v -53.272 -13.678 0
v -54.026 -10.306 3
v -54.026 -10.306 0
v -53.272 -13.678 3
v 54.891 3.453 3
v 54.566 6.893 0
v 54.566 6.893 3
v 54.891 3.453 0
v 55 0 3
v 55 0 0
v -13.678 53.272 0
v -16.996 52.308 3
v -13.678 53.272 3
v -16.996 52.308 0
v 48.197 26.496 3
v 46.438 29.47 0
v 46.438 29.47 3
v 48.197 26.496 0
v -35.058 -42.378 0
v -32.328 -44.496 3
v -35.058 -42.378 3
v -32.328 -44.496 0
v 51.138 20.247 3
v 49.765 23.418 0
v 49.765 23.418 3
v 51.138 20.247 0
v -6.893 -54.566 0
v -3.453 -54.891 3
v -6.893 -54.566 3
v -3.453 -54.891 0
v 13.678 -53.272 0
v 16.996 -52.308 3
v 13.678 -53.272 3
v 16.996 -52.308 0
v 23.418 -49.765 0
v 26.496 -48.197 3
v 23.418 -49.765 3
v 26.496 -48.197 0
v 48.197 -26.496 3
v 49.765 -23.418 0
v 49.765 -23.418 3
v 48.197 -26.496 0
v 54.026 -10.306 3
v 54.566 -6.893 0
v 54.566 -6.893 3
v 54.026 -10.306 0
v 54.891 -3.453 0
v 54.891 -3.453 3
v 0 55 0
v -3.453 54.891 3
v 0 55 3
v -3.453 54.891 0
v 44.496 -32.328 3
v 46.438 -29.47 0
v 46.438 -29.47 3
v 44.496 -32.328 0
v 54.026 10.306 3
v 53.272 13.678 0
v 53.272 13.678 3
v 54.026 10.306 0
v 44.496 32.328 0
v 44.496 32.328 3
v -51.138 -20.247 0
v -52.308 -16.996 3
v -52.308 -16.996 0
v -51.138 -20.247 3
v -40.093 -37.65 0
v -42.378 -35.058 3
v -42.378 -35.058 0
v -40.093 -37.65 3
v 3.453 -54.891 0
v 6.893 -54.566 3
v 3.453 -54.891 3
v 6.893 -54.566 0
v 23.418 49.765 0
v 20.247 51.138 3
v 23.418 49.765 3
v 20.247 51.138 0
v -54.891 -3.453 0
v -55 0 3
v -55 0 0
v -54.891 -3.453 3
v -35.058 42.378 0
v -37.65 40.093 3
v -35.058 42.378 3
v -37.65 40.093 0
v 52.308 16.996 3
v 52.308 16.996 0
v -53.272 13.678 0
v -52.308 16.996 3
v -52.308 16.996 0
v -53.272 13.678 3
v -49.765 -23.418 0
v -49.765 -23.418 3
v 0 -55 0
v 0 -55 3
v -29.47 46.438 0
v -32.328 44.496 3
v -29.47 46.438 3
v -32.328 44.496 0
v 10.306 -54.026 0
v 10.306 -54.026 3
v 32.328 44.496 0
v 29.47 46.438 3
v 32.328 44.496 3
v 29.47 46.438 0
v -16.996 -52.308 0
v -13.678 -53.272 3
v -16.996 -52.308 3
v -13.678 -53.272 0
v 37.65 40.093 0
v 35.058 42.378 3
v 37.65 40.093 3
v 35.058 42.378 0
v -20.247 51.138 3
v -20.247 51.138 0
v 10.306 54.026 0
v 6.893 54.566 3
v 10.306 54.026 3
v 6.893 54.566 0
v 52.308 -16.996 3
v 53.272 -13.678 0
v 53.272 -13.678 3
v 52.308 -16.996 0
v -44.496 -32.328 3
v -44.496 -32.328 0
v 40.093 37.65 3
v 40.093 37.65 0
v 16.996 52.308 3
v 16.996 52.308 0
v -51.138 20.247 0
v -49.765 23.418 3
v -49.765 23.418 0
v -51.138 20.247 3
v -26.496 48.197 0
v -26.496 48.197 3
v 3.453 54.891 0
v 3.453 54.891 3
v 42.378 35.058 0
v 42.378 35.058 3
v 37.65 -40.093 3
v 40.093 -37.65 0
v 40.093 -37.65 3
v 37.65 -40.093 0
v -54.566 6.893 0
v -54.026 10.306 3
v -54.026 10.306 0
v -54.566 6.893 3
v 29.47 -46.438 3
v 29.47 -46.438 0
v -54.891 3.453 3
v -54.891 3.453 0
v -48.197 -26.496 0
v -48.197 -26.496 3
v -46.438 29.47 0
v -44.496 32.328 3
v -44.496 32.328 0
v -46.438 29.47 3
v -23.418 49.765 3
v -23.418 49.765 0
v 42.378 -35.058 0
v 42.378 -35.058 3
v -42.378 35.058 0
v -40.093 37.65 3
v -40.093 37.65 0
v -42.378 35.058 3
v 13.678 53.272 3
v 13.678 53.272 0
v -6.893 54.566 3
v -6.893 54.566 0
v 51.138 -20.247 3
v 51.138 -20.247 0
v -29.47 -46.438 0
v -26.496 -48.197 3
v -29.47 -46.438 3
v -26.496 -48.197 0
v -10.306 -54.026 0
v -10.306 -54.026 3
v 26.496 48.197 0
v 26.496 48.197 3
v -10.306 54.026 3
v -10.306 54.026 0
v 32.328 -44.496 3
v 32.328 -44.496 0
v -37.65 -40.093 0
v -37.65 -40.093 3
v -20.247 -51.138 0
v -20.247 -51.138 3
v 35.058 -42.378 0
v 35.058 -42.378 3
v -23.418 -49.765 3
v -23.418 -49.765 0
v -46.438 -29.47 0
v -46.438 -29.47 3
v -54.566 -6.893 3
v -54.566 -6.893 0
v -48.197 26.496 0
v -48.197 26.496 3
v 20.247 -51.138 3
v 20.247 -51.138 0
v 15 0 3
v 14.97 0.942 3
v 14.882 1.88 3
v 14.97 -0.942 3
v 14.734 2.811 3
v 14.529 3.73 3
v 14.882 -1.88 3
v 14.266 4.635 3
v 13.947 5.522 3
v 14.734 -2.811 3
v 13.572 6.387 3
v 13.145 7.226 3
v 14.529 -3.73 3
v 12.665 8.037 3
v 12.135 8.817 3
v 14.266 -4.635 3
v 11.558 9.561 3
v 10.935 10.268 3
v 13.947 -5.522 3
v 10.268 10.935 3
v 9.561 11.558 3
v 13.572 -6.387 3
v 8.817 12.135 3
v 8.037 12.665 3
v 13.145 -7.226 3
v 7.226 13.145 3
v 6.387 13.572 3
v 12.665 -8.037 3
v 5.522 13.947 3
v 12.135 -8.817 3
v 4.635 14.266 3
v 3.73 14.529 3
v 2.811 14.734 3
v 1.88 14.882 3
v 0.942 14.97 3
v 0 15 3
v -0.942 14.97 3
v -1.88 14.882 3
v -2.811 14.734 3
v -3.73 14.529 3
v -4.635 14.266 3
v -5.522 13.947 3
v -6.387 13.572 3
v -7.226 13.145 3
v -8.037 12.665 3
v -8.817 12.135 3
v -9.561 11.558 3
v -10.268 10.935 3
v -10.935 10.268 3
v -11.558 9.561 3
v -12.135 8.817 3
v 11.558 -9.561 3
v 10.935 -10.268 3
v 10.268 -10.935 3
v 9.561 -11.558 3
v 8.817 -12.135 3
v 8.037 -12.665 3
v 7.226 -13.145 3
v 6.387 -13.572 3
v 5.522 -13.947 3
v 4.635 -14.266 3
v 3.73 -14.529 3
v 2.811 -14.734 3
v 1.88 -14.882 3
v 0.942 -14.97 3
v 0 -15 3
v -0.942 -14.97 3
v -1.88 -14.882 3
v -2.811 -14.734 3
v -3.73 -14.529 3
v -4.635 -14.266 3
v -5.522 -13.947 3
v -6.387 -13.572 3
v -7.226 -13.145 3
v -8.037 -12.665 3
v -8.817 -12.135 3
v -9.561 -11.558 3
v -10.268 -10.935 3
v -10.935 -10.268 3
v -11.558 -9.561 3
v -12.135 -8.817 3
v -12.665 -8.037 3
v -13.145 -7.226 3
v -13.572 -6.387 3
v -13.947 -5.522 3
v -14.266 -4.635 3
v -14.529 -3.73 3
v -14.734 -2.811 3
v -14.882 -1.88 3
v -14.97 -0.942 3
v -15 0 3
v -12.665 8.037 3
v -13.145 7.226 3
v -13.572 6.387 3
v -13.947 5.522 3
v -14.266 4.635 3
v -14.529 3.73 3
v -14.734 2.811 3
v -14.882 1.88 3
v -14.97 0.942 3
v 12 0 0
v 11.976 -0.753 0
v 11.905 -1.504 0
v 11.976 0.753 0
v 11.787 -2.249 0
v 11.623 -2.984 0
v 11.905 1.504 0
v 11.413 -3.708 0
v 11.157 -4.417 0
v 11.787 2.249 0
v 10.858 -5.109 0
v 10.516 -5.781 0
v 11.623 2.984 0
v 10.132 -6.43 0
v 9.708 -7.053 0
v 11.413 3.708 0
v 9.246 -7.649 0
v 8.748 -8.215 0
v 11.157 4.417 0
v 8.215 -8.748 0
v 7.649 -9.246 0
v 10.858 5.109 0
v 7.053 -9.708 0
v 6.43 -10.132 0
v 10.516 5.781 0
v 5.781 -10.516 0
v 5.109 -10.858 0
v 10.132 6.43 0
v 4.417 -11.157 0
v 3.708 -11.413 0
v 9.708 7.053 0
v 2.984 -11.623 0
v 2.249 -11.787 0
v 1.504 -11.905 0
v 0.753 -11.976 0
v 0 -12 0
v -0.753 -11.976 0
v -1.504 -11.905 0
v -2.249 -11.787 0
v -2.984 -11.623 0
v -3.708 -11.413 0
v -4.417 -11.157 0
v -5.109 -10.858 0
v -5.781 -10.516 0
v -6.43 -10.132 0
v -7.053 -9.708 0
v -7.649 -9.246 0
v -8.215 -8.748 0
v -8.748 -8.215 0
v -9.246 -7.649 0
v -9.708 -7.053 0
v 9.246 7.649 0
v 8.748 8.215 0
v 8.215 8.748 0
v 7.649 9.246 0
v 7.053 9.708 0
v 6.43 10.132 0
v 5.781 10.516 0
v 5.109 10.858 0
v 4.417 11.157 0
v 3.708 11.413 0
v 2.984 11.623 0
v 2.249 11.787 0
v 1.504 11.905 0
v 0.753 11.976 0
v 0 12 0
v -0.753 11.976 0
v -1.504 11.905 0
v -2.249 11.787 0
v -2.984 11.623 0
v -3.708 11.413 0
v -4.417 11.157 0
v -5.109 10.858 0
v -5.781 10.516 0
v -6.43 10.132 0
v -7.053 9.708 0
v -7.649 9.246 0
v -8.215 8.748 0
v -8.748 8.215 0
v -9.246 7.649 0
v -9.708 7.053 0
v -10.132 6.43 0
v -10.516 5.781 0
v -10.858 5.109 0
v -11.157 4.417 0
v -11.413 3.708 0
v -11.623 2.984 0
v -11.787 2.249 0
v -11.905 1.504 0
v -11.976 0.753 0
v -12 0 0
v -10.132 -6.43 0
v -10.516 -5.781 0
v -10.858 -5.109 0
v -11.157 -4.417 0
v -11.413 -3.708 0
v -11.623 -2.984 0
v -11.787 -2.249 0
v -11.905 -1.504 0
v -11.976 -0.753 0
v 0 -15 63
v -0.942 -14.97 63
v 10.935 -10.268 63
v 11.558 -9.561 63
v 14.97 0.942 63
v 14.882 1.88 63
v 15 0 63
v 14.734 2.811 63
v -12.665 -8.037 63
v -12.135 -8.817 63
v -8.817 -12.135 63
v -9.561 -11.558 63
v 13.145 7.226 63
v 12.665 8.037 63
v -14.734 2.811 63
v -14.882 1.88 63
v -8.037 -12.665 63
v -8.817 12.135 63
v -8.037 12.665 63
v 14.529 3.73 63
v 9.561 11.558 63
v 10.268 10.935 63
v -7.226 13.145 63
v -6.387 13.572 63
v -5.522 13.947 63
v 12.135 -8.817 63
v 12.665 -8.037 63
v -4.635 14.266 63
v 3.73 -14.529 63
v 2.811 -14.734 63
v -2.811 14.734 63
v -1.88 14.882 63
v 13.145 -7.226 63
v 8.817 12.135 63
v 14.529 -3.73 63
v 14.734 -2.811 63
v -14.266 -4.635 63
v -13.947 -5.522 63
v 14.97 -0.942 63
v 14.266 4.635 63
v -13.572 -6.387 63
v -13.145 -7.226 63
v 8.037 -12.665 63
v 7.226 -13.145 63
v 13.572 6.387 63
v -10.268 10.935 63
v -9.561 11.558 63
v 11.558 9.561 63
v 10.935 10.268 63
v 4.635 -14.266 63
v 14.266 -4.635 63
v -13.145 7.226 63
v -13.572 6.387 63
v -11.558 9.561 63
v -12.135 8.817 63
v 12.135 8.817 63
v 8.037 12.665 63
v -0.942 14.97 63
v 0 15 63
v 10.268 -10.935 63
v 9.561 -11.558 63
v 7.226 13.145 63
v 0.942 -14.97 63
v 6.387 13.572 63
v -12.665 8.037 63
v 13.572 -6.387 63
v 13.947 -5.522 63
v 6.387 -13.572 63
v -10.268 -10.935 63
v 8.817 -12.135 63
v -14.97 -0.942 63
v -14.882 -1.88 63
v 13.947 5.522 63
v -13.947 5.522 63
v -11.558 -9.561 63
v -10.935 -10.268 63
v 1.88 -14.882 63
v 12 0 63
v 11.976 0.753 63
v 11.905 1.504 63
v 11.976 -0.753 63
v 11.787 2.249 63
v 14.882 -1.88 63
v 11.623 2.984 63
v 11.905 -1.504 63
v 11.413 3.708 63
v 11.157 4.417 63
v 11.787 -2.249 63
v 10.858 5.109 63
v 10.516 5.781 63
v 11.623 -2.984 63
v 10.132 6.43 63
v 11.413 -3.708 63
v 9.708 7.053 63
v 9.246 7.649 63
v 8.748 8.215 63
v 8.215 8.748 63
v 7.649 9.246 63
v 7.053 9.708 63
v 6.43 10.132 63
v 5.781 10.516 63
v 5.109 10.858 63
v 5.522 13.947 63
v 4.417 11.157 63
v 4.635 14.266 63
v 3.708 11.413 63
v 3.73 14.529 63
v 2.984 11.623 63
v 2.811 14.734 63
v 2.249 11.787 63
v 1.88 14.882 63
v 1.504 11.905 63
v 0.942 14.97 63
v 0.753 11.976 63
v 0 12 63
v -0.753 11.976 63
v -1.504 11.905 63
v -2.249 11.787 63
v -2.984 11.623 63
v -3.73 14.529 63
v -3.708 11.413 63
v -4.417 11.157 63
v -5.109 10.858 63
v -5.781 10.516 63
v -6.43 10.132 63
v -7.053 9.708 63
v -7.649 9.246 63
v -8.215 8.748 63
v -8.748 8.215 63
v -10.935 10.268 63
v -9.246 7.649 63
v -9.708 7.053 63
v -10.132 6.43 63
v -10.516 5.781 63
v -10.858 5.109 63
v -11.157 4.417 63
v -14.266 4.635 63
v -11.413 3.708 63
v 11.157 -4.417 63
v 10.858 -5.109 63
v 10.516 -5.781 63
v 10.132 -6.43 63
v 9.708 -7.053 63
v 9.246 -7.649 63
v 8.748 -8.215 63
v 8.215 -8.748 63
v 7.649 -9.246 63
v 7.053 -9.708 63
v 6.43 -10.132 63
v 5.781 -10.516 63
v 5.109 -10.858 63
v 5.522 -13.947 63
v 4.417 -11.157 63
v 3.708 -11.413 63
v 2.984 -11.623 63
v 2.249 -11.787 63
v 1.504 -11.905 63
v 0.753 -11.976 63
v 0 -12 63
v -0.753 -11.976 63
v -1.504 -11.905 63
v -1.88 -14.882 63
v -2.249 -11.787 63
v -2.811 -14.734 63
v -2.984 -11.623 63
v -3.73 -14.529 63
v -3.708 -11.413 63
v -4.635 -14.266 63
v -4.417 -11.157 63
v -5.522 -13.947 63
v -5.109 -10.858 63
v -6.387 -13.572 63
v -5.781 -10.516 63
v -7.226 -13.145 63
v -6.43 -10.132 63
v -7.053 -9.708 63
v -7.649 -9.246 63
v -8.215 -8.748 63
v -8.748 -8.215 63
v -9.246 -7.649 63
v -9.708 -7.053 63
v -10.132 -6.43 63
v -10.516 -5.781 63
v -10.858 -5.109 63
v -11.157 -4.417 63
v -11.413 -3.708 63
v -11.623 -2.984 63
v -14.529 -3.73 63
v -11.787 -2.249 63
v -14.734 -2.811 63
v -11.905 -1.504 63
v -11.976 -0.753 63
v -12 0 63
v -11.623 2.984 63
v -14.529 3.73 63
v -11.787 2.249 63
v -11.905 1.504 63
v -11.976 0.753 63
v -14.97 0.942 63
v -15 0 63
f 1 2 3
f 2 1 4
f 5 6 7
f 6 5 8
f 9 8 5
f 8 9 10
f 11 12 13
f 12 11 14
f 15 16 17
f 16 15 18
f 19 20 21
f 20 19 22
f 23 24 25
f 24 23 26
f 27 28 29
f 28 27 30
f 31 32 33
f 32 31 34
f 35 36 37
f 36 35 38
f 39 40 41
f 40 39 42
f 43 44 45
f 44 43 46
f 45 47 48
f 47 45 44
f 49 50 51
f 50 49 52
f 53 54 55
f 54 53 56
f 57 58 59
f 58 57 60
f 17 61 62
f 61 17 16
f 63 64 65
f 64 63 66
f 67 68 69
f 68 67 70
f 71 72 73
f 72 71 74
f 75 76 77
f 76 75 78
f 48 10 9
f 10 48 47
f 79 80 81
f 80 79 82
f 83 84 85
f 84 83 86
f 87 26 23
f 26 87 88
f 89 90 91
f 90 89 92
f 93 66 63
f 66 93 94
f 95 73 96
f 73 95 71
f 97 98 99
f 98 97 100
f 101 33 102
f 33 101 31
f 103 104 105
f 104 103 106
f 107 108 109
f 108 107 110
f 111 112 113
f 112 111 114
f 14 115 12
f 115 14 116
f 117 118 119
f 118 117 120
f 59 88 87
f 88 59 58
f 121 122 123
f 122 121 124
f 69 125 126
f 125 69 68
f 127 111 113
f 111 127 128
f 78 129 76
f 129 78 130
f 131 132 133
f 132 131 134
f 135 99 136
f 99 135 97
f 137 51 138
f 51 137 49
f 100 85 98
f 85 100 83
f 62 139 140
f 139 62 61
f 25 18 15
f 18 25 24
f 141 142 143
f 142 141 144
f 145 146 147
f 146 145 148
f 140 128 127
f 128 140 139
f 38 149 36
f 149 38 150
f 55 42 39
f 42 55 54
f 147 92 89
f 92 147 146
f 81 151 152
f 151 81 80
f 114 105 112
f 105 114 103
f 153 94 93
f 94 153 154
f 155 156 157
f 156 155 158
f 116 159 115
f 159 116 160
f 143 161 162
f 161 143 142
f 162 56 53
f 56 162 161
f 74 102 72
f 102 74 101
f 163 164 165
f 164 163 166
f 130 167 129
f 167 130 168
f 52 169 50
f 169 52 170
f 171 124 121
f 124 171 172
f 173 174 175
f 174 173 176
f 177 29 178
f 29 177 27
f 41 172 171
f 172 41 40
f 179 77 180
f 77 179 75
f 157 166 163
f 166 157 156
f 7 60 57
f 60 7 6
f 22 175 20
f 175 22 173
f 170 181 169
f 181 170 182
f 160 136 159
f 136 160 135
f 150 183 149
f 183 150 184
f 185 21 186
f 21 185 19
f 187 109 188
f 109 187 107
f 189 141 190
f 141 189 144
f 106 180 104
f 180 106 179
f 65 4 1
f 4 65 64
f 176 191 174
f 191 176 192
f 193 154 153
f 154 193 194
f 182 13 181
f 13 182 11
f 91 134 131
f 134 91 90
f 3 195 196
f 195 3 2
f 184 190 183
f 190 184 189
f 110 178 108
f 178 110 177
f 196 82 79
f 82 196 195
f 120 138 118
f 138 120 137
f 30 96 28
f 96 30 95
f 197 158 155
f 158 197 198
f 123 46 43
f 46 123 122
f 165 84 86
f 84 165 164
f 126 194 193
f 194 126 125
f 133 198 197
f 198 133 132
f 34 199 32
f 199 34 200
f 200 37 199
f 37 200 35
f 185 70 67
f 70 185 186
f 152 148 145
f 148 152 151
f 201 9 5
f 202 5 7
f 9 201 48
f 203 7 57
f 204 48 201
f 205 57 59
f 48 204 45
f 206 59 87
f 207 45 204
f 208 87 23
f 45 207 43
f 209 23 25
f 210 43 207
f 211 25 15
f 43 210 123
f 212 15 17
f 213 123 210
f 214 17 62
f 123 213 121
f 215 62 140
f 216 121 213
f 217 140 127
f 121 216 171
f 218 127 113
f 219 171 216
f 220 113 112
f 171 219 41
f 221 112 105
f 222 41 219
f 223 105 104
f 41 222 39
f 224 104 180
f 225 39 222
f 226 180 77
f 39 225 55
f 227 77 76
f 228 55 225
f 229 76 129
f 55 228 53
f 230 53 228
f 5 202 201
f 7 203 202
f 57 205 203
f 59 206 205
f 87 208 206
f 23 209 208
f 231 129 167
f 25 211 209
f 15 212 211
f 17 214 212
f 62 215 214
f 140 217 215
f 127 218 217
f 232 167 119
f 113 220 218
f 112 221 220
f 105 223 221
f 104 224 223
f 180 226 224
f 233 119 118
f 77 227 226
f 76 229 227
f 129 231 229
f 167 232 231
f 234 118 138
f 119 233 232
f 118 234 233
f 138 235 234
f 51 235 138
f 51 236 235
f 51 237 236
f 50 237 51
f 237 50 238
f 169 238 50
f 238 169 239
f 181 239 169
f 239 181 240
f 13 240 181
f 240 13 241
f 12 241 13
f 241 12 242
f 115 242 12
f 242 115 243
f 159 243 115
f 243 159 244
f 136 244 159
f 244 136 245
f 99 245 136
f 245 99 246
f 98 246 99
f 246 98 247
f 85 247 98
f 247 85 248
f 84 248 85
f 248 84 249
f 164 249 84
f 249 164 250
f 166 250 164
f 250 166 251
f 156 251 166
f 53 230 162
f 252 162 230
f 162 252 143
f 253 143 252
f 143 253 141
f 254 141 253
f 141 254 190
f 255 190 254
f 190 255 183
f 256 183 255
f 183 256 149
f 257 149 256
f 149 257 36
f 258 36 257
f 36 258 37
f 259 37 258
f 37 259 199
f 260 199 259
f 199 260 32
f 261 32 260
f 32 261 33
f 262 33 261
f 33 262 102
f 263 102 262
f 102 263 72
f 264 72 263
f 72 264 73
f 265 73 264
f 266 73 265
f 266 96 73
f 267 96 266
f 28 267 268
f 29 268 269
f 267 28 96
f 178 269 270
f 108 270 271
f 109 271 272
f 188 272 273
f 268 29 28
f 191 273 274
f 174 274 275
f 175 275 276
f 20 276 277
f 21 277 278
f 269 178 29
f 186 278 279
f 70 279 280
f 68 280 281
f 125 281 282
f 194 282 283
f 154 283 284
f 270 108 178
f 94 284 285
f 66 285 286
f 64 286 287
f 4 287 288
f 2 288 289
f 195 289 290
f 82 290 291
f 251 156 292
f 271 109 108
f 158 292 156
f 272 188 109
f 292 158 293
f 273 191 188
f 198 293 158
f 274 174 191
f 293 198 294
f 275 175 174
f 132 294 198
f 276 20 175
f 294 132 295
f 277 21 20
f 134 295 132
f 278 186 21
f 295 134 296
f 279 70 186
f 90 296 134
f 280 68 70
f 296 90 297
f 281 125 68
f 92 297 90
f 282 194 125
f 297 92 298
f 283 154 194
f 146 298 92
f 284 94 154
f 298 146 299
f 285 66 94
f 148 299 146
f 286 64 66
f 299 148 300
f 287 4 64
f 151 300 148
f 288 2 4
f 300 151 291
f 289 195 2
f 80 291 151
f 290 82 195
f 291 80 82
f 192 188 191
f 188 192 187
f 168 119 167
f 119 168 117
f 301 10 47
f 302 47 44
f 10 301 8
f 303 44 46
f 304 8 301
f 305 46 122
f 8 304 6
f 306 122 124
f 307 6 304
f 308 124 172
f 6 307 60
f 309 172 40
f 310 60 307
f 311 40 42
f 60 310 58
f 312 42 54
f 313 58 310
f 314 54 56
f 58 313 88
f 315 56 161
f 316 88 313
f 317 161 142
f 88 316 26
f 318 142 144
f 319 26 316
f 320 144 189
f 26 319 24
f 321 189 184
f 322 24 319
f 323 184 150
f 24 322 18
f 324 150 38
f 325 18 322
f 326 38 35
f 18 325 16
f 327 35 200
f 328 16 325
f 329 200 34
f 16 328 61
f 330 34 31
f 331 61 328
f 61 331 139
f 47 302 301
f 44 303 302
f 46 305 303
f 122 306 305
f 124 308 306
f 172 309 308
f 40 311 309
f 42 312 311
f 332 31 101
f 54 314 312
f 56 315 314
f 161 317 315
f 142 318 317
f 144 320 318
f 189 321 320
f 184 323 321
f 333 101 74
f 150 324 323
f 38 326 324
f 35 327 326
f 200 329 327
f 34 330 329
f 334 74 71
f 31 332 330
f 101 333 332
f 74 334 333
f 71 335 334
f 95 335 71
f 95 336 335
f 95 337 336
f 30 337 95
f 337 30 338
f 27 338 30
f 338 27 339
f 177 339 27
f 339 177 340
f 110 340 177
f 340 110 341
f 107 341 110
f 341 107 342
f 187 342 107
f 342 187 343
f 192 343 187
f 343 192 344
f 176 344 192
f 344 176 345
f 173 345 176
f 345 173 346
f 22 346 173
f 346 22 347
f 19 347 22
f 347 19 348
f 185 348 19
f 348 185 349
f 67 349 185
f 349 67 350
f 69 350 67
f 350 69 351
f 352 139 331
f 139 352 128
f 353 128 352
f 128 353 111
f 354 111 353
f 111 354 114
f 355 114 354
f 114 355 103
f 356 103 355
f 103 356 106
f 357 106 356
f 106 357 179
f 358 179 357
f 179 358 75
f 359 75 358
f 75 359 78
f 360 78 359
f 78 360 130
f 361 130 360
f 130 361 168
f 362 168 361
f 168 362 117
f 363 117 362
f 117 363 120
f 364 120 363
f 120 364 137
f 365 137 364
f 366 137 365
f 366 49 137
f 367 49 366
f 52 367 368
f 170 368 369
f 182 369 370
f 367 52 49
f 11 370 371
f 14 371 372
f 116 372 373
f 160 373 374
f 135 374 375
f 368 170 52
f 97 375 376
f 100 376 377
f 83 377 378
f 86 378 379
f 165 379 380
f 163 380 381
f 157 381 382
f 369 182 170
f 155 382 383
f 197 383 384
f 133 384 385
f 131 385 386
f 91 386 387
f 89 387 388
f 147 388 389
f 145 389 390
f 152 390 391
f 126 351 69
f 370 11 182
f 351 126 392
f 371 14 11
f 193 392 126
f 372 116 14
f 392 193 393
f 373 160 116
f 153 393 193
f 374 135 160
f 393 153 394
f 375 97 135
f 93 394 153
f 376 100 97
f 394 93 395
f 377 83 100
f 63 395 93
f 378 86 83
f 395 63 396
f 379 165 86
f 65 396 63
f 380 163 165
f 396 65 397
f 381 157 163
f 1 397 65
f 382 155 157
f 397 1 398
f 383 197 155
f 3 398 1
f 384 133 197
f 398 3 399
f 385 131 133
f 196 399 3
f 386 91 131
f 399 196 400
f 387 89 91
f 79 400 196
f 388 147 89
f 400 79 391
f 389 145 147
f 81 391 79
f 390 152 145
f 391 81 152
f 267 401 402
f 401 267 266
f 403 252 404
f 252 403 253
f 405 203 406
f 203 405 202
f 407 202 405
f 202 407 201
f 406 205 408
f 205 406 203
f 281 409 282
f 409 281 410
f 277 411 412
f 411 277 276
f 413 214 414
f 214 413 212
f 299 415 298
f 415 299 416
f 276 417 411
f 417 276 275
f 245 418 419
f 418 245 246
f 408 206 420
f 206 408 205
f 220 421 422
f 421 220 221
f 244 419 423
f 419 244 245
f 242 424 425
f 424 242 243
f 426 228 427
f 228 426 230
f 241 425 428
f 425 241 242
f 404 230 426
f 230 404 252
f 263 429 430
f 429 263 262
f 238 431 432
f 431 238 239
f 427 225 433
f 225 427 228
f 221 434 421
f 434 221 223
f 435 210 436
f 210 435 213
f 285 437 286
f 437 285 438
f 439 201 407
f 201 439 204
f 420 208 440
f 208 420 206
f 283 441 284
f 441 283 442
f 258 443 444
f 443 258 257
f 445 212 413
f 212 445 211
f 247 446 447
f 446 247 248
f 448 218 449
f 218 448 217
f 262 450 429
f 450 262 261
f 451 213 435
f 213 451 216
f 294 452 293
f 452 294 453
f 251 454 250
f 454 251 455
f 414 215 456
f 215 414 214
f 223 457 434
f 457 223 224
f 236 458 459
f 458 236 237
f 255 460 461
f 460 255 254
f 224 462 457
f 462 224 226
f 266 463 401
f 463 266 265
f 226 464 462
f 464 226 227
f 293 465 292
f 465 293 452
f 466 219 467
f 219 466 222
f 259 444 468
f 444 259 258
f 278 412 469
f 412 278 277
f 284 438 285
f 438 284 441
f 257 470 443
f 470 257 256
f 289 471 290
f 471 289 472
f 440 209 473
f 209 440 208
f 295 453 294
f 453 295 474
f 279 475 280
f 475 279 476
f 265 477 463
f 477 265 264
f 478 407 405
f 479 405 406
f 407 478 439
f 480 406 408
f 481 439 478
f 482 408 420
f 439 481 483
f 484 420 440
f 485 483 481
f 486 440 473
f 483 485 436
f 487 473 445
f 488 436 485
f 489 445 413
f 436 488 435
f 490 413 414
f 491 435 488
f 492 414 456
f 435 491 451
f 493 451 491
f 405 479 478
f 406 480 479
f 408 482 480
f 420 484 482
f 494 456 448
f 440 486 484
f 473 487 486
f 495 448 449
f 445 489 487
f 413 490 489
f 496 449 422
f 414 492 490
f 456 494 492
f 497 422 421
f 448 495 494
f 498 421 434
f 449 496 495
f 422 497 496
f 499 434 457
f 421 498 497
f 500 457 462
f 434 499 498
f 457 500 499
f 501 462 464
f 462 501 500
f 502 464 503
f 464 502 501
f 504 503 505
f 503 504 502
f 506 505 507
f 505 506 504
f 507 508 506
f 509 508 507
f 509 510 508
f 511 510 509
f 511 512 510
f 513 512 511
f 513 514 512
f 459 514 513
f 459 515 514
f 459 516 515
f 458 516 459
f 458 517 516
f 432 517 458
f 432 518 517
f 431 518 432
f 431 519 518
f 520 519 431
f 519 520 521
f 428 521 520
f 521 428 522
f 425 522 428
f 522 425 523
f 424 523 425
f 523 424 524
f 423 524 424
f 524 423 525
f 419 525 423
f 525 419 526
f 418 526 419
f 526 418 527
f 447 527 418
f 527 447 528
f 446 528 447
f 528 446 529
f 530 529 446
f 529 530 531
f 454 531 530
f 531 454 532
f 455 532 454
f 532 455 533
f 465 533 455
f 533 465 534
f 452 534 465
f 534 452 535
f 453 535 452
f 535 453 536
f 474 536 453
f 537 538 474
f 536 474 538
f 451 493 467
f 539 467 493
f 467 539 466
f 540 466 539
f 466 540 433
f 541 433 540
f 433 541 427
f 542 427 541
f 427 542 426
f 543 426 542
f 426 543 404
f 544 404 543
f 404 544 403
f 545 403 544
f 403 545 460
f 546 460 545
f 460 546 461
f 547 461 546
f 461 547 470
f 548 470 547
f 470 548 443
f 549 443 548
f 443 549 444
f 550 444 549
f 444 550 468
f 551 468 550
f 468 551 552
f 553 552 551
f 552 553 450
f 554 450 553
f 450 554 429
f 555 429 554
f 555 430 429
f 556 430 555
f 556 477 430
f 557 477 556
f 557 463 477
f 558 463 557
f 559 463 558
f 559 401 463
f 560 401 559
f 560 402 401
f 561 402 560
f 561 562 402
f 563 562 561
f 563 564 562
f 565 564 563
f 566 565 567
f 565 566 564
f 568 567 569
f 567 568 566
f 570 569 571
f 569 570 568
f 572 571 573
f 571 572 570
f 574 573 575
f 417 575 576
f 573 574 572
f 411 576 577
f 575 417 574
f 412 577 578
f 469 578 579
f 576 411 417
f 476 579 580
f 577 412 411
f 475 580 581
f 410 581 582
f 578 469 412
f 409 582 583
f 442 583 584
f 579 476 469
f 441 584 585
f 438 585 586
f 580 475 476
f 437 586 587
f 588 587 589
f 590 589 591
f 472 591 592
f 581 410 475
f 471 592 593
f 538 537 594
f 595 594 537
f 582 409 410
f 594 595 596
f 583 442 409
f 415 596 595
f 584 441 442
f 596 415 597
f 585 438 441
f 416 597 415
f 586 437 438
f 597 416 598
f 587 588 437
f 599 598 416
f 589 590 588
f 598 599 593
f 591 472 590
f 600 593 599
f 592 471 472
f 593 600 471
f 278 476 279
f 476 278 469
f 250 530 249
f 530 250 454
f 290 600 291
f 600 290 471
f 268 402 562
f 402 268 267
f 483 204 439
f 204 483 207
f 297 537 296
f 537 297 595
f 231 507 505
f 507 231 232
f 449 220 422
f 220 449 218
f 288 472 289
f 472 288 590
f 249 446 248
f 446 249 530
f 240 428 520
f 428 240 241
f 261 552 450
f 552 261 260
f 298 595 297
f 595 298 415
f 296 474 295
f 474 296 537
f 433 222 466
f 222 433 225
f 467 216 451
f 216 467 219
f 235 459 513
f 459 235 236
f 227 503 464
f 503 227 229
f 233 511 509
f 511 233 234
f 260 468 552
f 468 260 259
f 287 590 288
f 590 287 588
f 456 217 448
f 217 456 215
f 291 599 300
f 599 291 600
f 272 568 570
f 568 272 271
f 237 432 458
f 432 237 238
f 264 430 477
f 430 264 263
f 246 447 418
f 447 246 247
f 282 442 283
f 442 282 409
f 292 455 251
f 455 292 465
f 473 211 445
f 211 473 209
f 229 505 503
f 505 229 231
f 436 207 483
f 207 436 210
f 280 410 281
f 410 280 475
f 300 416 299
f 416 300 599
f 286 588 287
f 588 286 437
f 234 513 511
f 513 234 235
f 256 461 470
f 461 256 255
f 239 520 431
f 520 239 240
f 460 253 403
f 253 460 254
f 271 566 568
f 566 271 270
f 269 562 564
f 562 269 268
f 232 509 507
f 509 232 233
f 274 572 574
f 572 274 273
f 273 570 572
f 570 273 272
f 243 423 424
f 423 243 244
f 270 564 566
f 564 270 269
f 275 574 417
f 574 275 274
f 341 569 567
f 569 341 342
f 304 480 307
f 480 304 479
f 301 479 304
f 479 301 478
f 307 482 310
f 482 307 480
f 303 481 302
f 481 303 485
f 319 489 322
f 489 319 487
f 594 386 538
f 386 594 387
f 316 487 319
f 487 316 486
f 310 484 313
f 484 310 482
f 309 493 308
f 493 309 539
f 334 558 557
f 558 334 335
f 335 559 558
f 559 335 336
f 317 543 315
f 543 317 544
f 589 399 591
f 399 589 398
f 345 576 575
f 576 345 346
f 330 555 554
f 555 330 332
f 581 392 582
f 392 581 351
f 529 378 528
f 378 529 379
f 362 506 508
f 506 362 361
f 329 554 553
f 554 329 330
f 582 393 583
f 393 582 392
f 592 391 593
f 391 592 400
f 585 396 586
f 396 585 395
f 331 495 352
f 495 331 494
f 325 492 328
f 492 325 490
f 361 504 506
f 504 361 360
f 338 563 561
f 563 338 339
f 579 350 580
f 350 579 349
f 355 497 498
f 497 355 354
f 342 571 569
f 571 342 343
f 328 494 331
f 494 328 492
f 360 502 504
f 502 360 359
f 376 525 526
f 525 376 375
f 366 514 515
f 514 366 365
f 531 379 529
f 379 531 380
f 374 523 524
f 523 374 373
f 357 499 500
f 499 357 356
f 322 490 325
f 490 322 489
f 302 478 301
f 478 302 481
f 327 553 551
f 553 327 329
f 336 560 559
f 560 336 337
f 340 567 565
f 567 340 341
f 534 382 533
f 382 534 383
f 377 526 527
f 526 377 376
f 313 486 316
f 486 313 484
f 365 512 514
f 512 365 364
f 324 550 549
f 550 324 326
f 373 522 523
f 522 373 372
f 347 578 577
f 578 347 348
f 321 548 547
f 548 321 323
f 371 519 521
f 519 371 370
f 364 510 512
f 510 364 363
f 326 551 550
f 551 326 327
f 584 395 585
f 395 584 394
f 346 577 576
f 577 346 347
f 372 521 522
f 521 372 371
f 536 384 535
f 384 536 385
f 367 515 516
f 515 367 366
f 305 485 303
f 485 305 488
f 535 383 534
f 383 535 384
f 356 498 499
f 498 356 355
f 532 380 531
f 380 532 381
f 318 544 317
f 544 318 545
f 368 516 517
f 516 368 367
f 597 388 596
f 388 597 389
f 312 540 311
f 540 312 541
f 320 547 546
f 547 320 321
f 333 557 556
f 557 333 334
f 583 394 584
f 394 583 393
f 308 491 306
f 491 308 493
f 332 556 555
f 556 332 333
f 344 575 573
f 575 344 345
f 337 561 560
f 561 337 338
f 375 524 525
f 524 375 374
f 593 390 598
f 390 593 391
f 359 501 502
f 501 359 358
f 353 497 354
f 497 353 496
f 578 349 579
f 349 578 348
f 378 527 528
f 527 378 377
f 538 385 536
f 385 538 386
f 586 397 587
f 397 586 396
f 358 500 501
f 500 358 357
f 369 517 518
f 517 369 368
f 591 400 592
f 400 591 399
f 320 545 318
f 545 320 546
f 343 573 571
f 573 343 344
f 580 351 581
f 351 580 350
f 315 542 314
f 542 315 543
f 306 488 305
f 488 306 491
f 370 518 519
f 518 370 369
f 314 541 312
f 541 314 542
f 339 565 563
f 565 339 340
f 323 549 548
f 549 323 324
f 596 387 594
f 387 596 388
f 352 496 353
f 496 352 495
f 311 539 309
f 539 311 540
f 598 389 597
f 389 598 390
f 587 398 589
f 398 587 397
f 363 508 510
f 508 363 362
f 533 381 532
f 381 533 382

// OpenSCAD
// Enter the spool hole diameter in mm
spoolHoleD = 32;

// Enter the thickness of the spool in mm
spoolHeight = 60;


difference()
{
    union()
    {
        cylinder(r = 55, h = 3);
        cylinder(r = (spoolHoleD-2)/2, h = spoolHeight+3);
    }
    cylinder(r = ((spoolHoleD-2)/2)-3, h = spoolHeight+3);
}
$fn = 100;
